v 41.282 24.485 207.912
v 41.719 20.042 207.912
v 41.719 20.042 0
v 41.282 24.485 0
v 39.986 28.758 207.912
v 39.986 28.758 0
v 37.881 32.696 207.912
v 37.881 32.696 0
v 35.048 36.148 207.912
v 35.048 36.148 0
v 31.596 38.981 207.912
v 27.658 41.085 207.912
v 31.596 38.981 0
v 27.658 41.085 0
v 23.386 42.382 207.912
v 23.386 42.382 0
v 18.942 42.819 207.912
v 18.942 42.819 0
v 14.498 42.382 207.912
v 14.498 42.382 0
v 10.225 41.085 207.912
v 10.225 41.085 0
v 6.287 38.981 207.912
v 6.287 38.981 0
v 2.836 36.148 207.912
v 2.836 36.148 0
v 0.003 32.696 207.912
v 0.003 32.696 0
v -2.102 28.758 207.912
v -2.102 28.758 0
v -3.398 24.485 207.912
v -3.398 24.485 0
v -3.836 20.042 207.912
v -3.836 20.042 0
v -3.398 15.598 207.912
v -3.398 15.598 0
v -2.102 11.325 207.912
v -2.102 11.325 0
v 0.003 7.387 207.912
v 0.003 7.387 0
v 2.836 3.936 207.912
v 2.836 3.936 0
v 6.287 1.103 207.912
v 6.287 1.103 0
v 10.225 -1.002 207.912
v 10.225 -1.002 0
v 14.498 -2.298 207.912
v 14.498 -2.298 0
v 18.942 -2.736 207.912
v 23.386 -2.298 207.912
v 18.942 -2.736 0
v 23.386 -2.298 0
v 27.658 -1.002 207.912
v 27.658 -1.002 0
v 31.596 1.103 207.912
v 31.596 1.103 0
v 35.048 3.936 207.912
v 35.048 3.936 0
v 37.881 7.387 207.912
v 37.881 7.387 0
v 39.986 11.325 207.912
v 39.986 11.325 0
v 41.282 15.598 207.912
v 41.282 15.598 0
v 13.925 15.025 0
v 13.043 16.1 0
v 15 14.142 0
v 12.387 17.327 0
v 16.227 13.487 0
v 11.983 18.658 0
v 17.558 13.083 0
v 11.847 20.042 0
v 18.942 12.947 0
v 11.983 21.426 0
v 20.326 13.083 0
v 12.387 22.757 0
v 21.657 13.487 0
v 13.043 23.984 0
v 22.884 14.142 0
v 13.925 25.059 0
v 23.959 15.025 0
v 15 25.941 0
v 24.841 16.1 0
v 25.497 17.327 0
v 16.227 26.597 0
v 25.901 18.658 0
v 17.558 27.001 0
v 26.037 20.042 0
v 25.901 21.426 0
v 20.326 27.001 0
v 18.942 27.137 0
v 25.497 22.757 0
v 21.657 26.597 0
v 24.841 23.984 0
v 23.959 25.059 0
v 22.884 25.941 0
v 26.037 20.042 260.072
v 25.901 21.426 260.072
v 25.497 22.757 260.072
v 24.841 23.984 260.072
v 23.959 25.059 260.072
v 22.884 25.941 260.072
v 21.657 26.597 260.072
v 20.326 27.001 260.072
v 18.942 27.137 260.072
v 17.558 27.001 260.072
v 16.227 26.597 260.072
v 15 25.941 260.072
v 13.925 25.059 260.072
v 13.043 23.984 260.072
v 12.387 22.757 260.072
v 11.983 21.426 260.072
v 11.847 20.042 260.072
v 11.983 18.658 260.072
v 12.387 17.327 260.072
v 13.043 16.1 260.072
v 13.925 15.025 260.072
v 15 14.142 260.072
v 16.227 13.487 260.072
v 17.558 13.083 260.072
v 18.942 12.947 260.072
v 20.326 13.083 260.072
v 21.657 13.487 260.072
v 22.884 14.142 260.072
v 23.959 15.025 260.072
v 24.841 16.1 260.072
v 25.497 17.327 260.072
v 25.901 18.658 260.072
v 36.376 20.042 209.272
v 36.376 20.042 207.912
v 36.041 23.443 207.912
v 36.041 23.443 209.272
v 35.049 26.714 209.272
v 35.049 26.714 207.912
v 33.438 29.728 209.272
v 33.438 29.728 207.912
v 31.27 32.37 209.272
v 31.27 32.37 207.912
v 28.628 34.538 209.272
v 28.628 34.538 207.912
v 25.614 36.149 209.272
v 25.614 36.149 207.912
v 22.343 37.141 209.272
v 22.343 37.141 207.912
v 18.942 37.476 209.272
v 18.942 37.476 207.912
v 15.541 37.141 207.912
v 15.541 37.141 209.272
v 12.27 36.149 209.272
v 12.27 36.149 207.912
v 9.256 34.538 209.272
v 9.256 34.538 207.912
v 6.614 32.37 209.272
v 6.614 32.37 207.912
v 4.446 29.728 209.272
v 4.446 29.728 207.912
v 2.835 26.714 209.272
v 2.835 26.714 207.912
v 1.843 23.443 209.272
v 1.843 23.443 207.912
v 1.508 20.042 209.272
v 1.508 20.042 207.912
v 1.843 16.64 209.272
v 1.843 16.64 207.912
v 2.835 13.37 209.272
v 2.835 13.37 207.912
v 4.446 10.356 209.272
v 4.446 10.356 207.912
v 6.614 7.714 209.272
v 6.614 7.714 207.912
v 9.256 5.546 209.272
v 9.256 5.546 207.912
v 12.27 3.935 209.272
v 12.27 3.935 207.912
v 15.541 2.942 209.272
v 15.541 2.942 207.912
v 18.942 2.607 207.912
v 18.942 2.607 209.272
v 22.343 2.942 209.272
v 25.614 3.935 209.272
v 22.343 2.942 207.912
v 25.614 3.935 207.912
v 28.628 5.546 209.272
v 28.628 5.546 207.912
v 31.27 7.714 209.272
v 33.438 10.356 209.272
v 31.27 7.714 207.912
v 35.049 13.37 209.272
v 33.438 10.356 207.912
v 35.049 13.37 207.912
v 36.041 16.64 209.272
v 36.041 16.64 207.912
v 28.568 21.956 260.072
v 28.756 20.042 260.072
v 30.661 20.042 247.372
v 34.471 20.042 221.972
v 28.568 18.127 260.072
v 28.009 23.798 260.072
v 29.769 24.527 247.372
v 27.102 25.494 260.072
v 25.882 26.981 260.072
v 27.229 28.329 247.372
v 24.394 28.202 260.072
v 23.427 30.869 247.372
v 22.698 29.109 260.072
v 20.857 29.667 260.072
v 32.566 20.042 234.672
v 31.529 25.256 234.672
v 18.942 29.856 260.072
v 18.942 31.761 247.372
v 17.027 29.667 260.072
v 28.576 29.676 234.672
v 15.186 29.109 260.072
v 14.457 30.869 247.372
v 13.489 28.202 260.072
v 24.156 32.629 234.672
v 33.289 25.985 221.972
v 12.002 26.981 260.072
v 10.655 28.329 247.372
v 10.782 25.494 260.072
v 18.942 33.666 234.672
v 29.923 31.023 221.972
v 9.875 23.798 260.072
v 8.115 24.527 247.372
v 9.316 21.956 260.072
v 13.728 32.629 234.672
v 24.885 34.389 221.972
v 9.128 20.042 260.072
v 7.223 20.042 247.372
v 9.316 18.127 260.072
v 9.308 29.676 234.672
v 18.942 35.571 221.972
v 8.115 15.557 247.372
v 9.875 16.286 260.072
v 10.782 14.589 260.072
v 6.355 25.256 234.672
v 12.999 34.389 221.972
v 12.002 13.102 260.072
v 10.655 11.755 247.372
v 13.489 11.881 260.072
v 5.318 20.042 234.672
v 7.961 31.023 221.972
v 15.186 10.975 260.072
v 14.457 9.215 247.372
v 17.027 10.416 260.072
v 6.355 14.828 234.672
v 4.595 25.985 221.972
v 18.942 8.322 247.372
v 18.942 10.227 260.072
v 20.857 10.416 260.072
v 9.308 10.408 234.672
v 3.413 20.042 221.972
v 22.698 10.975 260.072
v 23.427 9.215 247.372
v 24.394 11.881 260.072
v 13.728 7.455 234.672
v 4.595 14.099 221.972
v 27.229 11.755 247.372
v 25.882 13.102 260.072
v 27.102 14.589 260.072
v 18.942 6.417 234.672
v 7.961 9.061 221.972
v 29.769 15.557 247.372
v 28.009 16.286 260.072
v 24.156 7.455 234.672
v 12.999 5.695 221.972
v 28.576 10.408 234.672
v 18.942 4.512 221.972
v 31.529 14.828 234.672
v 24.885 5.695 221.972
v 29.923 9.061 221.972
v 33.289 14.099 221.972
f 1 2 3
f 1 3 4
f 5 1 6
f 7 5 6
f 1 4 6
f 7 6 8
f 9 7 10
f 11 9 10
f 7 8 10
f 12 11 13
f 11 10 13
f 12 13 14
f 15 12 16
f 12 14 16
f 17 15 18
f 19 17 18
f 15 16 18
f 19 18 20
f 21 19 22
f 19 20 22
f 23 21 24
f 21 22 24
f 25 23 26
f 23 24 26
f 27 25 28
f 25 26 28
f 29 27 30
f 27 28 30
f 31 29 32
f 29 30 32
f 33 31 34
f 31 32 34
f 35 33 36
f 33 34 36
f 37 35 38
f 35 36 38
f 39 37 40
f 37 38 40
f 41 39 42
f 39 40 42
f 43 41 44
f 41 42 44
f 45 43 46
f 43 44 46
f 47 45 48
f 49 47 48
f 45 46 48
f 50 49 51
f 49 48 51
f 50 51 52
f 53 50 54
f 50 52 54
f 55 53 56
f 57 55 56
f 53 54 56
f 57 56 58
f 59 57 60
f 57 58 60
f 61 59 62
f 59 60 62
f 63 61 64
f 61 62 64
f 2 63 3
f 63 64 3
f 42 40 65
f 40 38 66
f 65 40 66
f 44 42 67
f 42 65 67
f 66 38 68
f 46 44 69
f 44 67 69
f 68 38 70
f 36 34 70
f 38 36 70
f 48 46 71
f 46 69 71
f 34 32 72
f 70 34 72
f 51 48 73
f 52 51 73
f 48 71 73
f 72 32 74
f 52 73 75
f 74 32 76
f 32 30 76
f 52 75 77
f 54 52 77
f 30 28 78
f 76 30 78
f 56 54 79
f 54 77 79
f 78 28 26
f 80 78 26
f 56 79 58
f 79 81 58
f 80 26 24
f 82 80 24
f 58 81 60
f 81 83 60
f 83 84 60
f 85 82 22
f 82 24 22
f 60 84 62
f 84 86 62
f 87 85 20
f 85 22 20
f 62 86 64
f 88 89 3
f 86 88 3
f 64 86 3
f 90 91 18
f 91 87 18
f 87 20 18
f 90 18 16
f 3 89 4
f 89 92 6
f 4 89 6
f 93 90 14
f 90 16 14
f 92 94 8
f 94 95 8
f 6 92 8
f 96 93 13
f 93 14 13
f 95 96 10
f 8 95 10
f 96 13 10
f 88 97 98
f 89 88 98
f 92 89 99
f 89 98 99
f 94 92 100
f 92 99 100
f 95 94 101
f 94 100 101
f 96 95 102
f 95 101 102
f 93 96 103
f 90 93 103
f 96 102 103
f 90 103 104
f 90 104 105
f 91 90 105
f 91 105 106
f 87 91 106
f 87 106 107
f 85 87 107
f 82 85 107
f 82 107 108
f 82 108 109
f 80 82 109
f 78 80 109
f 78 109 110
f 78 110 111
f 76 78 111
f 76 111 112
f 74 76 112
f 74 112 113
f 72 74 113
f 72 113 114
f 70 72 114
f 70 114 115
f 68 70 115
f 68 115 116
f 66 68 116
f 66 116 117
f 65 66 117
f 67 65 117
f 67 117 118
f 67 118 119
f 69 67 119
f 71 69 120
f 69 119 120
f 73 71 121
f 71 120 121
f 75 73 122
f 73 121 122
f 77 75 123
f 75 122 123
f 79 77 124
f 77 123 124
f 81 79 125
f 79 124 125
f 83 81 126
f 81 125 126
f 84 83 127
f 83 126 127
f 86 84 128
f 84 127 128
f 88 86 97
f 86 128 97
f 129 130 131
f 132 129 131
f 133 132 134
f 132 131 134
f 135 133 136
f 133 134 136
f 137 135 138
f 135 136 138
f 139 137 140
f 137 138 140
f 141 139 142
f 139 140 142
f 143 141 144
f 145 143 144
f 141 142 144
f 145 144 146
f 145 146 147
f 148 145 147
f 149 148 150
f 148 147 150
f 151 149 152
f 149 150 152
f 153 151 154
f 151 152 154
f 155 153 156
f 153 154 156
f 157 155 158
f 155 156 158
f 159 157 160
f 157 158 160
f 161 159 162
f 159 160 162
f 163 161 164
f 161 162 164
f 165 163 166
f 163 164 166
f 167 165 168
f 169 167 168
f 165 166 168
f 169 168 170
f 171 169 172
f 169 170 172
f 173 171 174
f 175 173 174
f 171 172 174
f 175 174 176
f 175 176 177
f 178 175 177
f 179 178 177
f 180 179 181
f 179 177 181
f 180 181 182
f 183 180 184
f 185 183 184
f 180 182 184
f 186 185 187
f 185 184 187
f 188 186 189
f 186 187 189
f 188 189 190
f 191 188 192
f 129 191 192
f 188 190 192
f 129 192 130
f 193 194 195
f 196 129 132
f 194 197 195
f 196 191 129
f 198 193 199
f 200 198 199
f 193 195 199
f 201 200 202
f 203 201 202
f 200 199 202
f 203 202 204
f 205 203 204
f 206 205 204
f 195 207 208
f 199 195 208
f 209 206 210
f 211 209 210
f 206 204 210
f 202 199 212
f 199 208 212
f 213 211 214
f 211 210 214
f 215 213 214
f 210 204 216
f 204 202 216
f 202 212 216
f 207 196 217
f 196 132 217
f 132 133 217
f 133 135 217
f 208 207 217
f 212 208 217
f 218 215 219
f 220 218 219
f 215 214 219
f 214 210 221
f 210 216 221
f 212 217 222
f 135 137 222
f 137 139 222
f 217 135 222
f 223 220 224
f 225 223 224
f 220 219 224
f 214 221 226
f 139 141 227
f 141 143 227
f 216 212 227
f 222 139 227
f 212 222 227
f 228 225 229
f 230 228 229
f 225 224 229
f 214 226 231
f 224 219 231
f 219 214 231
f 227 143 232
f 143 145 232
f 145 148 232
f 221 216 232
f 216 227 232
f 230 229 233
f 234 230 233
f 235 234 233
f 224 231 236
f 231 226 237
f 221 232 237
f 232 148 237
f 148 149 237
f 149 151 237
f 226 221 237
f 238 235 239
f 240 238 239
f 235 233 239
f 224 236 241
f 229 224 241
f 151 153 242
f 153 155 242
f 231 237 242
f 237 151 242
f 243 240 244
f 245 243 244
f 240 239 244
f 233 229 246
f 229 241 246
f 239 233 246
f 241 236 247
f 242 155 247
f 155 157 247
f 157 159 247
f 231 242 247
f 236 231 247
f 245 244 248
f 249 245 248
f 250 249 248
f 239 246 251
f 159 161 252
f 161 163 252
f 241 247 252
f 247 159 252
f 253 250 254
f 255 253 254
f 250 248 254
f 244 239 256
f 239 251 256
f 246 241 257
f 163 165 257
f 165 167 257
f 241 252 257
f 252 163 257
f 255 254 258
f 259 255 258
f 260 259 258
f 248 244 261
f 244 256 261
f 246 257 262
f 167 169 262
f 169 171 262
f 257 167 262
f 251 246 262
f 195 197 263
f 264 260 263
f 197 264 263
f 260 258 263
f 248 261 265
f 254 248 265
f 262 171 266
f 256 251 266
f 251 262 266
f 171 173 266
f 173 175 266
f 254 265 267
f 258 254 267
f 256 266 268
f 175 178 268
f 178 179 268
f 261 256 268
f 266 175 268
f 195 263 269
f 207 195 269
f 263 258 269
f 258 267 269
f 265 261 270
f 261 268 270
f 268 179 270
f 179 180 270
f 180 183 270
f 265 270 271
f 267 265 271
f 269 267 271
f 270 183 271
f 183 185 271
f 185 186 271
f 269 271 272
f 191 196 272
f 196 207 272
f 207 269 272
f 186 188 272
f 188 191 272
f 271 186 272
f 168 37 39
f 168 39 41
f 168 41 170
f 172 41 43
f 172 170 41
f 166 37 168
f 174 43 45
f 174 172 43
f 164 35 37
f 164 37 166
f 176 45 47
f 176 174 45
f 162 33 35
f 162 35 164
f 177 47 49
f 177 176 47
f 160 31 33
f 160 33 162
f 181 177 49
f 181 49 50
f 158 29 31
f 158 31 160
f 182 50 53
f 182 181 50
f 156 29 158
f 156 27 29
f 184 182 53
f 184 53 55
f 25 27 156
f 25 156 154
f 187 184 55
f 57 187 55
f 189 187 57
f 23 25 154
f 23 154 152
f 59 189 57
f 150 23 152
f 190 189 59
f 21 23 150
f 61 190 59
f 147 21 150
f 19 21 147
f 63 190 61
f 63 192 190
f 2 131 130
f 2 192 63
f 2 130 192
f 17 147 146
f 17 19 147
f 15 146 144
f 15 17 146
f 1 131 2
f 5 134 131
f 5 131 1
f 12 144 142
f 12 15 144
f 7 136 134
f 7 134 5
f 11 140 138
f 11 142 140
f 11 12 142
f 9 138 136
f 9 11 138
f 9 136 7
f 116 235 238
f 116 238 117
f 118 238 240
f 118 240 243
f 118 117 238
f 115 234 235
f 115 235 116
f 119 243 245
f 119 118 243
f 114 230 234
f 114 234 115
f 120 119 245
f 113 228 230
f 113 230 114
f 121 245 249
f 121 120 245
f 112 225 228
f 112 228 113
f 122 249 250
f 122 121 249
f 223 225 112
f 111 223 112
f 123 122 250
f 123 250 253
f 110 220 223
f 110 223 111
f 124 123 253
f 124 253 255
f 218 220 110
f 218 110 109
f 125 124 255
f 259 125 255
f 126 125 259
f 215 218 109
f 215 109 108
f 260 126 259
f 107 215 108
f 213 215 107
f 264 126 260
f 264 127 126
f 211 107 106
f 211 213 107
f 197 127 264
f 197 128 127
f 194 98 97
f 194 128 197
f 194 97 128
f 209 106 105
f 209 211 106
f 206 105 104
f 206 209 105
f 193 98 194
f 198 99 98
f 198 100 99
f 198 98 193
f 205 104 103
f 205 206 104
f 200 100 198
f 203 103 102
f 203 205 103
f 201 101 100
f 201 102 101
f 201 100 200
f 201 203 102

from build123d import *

# Parameters (mm, degrees)
F0_R     = 22.7775322378
F1_DEPTH = 207.9115826637
F2_R     = 17.4342882966
F3_DEPTH = 52.1602202207
F4_SIZE2 = 50.8
F4_SIZE  = 7.62
F5_R     = 7.0950919486
F6_DEPTH = 295.2890638262


with BuildPart() as f1:
    # F0 (on Top) → F1 (new body)
    with BuildSketch(Plane.XY):
        with Locations((18.9419090748, 20.0417488813)):
            Circle(F0_R)
    extrude(amount=F1_DEPTH)

    # F2 (on face) → F3 (join)
    with BuildSketch(Plane.XY.offset(207.9115826637)):
        with Locations((18.9419090748, 20.0417488813)):
            Circle(F2_R)
    extrude(amount=F3_DEPTH)

    # F4
    f4_edges = [f1.edges().sort_by_distance(p)[0] for p in [
        (1.507621, 20.041749, 260.071803),
    ]]
    f4_side = f1.faces().sort_by_distance((18.941909, 20.041749, 260.071803))[0]
    chamfer(f4_edges, length=F4_SIZE, length2=F4_SIZE2, reference=f4_side)

    # F5 (on face) → F6 (cut)
    with BuildSketch(Plane.XY.offset(260.0718028843)):
        with Locations((18.9419090748, 20.0417488813)):
            Circle(F5_R)
    extrude(amount=-F6_DEPTH, mode=Mode.SUBTRACT)


solid = f1.part
